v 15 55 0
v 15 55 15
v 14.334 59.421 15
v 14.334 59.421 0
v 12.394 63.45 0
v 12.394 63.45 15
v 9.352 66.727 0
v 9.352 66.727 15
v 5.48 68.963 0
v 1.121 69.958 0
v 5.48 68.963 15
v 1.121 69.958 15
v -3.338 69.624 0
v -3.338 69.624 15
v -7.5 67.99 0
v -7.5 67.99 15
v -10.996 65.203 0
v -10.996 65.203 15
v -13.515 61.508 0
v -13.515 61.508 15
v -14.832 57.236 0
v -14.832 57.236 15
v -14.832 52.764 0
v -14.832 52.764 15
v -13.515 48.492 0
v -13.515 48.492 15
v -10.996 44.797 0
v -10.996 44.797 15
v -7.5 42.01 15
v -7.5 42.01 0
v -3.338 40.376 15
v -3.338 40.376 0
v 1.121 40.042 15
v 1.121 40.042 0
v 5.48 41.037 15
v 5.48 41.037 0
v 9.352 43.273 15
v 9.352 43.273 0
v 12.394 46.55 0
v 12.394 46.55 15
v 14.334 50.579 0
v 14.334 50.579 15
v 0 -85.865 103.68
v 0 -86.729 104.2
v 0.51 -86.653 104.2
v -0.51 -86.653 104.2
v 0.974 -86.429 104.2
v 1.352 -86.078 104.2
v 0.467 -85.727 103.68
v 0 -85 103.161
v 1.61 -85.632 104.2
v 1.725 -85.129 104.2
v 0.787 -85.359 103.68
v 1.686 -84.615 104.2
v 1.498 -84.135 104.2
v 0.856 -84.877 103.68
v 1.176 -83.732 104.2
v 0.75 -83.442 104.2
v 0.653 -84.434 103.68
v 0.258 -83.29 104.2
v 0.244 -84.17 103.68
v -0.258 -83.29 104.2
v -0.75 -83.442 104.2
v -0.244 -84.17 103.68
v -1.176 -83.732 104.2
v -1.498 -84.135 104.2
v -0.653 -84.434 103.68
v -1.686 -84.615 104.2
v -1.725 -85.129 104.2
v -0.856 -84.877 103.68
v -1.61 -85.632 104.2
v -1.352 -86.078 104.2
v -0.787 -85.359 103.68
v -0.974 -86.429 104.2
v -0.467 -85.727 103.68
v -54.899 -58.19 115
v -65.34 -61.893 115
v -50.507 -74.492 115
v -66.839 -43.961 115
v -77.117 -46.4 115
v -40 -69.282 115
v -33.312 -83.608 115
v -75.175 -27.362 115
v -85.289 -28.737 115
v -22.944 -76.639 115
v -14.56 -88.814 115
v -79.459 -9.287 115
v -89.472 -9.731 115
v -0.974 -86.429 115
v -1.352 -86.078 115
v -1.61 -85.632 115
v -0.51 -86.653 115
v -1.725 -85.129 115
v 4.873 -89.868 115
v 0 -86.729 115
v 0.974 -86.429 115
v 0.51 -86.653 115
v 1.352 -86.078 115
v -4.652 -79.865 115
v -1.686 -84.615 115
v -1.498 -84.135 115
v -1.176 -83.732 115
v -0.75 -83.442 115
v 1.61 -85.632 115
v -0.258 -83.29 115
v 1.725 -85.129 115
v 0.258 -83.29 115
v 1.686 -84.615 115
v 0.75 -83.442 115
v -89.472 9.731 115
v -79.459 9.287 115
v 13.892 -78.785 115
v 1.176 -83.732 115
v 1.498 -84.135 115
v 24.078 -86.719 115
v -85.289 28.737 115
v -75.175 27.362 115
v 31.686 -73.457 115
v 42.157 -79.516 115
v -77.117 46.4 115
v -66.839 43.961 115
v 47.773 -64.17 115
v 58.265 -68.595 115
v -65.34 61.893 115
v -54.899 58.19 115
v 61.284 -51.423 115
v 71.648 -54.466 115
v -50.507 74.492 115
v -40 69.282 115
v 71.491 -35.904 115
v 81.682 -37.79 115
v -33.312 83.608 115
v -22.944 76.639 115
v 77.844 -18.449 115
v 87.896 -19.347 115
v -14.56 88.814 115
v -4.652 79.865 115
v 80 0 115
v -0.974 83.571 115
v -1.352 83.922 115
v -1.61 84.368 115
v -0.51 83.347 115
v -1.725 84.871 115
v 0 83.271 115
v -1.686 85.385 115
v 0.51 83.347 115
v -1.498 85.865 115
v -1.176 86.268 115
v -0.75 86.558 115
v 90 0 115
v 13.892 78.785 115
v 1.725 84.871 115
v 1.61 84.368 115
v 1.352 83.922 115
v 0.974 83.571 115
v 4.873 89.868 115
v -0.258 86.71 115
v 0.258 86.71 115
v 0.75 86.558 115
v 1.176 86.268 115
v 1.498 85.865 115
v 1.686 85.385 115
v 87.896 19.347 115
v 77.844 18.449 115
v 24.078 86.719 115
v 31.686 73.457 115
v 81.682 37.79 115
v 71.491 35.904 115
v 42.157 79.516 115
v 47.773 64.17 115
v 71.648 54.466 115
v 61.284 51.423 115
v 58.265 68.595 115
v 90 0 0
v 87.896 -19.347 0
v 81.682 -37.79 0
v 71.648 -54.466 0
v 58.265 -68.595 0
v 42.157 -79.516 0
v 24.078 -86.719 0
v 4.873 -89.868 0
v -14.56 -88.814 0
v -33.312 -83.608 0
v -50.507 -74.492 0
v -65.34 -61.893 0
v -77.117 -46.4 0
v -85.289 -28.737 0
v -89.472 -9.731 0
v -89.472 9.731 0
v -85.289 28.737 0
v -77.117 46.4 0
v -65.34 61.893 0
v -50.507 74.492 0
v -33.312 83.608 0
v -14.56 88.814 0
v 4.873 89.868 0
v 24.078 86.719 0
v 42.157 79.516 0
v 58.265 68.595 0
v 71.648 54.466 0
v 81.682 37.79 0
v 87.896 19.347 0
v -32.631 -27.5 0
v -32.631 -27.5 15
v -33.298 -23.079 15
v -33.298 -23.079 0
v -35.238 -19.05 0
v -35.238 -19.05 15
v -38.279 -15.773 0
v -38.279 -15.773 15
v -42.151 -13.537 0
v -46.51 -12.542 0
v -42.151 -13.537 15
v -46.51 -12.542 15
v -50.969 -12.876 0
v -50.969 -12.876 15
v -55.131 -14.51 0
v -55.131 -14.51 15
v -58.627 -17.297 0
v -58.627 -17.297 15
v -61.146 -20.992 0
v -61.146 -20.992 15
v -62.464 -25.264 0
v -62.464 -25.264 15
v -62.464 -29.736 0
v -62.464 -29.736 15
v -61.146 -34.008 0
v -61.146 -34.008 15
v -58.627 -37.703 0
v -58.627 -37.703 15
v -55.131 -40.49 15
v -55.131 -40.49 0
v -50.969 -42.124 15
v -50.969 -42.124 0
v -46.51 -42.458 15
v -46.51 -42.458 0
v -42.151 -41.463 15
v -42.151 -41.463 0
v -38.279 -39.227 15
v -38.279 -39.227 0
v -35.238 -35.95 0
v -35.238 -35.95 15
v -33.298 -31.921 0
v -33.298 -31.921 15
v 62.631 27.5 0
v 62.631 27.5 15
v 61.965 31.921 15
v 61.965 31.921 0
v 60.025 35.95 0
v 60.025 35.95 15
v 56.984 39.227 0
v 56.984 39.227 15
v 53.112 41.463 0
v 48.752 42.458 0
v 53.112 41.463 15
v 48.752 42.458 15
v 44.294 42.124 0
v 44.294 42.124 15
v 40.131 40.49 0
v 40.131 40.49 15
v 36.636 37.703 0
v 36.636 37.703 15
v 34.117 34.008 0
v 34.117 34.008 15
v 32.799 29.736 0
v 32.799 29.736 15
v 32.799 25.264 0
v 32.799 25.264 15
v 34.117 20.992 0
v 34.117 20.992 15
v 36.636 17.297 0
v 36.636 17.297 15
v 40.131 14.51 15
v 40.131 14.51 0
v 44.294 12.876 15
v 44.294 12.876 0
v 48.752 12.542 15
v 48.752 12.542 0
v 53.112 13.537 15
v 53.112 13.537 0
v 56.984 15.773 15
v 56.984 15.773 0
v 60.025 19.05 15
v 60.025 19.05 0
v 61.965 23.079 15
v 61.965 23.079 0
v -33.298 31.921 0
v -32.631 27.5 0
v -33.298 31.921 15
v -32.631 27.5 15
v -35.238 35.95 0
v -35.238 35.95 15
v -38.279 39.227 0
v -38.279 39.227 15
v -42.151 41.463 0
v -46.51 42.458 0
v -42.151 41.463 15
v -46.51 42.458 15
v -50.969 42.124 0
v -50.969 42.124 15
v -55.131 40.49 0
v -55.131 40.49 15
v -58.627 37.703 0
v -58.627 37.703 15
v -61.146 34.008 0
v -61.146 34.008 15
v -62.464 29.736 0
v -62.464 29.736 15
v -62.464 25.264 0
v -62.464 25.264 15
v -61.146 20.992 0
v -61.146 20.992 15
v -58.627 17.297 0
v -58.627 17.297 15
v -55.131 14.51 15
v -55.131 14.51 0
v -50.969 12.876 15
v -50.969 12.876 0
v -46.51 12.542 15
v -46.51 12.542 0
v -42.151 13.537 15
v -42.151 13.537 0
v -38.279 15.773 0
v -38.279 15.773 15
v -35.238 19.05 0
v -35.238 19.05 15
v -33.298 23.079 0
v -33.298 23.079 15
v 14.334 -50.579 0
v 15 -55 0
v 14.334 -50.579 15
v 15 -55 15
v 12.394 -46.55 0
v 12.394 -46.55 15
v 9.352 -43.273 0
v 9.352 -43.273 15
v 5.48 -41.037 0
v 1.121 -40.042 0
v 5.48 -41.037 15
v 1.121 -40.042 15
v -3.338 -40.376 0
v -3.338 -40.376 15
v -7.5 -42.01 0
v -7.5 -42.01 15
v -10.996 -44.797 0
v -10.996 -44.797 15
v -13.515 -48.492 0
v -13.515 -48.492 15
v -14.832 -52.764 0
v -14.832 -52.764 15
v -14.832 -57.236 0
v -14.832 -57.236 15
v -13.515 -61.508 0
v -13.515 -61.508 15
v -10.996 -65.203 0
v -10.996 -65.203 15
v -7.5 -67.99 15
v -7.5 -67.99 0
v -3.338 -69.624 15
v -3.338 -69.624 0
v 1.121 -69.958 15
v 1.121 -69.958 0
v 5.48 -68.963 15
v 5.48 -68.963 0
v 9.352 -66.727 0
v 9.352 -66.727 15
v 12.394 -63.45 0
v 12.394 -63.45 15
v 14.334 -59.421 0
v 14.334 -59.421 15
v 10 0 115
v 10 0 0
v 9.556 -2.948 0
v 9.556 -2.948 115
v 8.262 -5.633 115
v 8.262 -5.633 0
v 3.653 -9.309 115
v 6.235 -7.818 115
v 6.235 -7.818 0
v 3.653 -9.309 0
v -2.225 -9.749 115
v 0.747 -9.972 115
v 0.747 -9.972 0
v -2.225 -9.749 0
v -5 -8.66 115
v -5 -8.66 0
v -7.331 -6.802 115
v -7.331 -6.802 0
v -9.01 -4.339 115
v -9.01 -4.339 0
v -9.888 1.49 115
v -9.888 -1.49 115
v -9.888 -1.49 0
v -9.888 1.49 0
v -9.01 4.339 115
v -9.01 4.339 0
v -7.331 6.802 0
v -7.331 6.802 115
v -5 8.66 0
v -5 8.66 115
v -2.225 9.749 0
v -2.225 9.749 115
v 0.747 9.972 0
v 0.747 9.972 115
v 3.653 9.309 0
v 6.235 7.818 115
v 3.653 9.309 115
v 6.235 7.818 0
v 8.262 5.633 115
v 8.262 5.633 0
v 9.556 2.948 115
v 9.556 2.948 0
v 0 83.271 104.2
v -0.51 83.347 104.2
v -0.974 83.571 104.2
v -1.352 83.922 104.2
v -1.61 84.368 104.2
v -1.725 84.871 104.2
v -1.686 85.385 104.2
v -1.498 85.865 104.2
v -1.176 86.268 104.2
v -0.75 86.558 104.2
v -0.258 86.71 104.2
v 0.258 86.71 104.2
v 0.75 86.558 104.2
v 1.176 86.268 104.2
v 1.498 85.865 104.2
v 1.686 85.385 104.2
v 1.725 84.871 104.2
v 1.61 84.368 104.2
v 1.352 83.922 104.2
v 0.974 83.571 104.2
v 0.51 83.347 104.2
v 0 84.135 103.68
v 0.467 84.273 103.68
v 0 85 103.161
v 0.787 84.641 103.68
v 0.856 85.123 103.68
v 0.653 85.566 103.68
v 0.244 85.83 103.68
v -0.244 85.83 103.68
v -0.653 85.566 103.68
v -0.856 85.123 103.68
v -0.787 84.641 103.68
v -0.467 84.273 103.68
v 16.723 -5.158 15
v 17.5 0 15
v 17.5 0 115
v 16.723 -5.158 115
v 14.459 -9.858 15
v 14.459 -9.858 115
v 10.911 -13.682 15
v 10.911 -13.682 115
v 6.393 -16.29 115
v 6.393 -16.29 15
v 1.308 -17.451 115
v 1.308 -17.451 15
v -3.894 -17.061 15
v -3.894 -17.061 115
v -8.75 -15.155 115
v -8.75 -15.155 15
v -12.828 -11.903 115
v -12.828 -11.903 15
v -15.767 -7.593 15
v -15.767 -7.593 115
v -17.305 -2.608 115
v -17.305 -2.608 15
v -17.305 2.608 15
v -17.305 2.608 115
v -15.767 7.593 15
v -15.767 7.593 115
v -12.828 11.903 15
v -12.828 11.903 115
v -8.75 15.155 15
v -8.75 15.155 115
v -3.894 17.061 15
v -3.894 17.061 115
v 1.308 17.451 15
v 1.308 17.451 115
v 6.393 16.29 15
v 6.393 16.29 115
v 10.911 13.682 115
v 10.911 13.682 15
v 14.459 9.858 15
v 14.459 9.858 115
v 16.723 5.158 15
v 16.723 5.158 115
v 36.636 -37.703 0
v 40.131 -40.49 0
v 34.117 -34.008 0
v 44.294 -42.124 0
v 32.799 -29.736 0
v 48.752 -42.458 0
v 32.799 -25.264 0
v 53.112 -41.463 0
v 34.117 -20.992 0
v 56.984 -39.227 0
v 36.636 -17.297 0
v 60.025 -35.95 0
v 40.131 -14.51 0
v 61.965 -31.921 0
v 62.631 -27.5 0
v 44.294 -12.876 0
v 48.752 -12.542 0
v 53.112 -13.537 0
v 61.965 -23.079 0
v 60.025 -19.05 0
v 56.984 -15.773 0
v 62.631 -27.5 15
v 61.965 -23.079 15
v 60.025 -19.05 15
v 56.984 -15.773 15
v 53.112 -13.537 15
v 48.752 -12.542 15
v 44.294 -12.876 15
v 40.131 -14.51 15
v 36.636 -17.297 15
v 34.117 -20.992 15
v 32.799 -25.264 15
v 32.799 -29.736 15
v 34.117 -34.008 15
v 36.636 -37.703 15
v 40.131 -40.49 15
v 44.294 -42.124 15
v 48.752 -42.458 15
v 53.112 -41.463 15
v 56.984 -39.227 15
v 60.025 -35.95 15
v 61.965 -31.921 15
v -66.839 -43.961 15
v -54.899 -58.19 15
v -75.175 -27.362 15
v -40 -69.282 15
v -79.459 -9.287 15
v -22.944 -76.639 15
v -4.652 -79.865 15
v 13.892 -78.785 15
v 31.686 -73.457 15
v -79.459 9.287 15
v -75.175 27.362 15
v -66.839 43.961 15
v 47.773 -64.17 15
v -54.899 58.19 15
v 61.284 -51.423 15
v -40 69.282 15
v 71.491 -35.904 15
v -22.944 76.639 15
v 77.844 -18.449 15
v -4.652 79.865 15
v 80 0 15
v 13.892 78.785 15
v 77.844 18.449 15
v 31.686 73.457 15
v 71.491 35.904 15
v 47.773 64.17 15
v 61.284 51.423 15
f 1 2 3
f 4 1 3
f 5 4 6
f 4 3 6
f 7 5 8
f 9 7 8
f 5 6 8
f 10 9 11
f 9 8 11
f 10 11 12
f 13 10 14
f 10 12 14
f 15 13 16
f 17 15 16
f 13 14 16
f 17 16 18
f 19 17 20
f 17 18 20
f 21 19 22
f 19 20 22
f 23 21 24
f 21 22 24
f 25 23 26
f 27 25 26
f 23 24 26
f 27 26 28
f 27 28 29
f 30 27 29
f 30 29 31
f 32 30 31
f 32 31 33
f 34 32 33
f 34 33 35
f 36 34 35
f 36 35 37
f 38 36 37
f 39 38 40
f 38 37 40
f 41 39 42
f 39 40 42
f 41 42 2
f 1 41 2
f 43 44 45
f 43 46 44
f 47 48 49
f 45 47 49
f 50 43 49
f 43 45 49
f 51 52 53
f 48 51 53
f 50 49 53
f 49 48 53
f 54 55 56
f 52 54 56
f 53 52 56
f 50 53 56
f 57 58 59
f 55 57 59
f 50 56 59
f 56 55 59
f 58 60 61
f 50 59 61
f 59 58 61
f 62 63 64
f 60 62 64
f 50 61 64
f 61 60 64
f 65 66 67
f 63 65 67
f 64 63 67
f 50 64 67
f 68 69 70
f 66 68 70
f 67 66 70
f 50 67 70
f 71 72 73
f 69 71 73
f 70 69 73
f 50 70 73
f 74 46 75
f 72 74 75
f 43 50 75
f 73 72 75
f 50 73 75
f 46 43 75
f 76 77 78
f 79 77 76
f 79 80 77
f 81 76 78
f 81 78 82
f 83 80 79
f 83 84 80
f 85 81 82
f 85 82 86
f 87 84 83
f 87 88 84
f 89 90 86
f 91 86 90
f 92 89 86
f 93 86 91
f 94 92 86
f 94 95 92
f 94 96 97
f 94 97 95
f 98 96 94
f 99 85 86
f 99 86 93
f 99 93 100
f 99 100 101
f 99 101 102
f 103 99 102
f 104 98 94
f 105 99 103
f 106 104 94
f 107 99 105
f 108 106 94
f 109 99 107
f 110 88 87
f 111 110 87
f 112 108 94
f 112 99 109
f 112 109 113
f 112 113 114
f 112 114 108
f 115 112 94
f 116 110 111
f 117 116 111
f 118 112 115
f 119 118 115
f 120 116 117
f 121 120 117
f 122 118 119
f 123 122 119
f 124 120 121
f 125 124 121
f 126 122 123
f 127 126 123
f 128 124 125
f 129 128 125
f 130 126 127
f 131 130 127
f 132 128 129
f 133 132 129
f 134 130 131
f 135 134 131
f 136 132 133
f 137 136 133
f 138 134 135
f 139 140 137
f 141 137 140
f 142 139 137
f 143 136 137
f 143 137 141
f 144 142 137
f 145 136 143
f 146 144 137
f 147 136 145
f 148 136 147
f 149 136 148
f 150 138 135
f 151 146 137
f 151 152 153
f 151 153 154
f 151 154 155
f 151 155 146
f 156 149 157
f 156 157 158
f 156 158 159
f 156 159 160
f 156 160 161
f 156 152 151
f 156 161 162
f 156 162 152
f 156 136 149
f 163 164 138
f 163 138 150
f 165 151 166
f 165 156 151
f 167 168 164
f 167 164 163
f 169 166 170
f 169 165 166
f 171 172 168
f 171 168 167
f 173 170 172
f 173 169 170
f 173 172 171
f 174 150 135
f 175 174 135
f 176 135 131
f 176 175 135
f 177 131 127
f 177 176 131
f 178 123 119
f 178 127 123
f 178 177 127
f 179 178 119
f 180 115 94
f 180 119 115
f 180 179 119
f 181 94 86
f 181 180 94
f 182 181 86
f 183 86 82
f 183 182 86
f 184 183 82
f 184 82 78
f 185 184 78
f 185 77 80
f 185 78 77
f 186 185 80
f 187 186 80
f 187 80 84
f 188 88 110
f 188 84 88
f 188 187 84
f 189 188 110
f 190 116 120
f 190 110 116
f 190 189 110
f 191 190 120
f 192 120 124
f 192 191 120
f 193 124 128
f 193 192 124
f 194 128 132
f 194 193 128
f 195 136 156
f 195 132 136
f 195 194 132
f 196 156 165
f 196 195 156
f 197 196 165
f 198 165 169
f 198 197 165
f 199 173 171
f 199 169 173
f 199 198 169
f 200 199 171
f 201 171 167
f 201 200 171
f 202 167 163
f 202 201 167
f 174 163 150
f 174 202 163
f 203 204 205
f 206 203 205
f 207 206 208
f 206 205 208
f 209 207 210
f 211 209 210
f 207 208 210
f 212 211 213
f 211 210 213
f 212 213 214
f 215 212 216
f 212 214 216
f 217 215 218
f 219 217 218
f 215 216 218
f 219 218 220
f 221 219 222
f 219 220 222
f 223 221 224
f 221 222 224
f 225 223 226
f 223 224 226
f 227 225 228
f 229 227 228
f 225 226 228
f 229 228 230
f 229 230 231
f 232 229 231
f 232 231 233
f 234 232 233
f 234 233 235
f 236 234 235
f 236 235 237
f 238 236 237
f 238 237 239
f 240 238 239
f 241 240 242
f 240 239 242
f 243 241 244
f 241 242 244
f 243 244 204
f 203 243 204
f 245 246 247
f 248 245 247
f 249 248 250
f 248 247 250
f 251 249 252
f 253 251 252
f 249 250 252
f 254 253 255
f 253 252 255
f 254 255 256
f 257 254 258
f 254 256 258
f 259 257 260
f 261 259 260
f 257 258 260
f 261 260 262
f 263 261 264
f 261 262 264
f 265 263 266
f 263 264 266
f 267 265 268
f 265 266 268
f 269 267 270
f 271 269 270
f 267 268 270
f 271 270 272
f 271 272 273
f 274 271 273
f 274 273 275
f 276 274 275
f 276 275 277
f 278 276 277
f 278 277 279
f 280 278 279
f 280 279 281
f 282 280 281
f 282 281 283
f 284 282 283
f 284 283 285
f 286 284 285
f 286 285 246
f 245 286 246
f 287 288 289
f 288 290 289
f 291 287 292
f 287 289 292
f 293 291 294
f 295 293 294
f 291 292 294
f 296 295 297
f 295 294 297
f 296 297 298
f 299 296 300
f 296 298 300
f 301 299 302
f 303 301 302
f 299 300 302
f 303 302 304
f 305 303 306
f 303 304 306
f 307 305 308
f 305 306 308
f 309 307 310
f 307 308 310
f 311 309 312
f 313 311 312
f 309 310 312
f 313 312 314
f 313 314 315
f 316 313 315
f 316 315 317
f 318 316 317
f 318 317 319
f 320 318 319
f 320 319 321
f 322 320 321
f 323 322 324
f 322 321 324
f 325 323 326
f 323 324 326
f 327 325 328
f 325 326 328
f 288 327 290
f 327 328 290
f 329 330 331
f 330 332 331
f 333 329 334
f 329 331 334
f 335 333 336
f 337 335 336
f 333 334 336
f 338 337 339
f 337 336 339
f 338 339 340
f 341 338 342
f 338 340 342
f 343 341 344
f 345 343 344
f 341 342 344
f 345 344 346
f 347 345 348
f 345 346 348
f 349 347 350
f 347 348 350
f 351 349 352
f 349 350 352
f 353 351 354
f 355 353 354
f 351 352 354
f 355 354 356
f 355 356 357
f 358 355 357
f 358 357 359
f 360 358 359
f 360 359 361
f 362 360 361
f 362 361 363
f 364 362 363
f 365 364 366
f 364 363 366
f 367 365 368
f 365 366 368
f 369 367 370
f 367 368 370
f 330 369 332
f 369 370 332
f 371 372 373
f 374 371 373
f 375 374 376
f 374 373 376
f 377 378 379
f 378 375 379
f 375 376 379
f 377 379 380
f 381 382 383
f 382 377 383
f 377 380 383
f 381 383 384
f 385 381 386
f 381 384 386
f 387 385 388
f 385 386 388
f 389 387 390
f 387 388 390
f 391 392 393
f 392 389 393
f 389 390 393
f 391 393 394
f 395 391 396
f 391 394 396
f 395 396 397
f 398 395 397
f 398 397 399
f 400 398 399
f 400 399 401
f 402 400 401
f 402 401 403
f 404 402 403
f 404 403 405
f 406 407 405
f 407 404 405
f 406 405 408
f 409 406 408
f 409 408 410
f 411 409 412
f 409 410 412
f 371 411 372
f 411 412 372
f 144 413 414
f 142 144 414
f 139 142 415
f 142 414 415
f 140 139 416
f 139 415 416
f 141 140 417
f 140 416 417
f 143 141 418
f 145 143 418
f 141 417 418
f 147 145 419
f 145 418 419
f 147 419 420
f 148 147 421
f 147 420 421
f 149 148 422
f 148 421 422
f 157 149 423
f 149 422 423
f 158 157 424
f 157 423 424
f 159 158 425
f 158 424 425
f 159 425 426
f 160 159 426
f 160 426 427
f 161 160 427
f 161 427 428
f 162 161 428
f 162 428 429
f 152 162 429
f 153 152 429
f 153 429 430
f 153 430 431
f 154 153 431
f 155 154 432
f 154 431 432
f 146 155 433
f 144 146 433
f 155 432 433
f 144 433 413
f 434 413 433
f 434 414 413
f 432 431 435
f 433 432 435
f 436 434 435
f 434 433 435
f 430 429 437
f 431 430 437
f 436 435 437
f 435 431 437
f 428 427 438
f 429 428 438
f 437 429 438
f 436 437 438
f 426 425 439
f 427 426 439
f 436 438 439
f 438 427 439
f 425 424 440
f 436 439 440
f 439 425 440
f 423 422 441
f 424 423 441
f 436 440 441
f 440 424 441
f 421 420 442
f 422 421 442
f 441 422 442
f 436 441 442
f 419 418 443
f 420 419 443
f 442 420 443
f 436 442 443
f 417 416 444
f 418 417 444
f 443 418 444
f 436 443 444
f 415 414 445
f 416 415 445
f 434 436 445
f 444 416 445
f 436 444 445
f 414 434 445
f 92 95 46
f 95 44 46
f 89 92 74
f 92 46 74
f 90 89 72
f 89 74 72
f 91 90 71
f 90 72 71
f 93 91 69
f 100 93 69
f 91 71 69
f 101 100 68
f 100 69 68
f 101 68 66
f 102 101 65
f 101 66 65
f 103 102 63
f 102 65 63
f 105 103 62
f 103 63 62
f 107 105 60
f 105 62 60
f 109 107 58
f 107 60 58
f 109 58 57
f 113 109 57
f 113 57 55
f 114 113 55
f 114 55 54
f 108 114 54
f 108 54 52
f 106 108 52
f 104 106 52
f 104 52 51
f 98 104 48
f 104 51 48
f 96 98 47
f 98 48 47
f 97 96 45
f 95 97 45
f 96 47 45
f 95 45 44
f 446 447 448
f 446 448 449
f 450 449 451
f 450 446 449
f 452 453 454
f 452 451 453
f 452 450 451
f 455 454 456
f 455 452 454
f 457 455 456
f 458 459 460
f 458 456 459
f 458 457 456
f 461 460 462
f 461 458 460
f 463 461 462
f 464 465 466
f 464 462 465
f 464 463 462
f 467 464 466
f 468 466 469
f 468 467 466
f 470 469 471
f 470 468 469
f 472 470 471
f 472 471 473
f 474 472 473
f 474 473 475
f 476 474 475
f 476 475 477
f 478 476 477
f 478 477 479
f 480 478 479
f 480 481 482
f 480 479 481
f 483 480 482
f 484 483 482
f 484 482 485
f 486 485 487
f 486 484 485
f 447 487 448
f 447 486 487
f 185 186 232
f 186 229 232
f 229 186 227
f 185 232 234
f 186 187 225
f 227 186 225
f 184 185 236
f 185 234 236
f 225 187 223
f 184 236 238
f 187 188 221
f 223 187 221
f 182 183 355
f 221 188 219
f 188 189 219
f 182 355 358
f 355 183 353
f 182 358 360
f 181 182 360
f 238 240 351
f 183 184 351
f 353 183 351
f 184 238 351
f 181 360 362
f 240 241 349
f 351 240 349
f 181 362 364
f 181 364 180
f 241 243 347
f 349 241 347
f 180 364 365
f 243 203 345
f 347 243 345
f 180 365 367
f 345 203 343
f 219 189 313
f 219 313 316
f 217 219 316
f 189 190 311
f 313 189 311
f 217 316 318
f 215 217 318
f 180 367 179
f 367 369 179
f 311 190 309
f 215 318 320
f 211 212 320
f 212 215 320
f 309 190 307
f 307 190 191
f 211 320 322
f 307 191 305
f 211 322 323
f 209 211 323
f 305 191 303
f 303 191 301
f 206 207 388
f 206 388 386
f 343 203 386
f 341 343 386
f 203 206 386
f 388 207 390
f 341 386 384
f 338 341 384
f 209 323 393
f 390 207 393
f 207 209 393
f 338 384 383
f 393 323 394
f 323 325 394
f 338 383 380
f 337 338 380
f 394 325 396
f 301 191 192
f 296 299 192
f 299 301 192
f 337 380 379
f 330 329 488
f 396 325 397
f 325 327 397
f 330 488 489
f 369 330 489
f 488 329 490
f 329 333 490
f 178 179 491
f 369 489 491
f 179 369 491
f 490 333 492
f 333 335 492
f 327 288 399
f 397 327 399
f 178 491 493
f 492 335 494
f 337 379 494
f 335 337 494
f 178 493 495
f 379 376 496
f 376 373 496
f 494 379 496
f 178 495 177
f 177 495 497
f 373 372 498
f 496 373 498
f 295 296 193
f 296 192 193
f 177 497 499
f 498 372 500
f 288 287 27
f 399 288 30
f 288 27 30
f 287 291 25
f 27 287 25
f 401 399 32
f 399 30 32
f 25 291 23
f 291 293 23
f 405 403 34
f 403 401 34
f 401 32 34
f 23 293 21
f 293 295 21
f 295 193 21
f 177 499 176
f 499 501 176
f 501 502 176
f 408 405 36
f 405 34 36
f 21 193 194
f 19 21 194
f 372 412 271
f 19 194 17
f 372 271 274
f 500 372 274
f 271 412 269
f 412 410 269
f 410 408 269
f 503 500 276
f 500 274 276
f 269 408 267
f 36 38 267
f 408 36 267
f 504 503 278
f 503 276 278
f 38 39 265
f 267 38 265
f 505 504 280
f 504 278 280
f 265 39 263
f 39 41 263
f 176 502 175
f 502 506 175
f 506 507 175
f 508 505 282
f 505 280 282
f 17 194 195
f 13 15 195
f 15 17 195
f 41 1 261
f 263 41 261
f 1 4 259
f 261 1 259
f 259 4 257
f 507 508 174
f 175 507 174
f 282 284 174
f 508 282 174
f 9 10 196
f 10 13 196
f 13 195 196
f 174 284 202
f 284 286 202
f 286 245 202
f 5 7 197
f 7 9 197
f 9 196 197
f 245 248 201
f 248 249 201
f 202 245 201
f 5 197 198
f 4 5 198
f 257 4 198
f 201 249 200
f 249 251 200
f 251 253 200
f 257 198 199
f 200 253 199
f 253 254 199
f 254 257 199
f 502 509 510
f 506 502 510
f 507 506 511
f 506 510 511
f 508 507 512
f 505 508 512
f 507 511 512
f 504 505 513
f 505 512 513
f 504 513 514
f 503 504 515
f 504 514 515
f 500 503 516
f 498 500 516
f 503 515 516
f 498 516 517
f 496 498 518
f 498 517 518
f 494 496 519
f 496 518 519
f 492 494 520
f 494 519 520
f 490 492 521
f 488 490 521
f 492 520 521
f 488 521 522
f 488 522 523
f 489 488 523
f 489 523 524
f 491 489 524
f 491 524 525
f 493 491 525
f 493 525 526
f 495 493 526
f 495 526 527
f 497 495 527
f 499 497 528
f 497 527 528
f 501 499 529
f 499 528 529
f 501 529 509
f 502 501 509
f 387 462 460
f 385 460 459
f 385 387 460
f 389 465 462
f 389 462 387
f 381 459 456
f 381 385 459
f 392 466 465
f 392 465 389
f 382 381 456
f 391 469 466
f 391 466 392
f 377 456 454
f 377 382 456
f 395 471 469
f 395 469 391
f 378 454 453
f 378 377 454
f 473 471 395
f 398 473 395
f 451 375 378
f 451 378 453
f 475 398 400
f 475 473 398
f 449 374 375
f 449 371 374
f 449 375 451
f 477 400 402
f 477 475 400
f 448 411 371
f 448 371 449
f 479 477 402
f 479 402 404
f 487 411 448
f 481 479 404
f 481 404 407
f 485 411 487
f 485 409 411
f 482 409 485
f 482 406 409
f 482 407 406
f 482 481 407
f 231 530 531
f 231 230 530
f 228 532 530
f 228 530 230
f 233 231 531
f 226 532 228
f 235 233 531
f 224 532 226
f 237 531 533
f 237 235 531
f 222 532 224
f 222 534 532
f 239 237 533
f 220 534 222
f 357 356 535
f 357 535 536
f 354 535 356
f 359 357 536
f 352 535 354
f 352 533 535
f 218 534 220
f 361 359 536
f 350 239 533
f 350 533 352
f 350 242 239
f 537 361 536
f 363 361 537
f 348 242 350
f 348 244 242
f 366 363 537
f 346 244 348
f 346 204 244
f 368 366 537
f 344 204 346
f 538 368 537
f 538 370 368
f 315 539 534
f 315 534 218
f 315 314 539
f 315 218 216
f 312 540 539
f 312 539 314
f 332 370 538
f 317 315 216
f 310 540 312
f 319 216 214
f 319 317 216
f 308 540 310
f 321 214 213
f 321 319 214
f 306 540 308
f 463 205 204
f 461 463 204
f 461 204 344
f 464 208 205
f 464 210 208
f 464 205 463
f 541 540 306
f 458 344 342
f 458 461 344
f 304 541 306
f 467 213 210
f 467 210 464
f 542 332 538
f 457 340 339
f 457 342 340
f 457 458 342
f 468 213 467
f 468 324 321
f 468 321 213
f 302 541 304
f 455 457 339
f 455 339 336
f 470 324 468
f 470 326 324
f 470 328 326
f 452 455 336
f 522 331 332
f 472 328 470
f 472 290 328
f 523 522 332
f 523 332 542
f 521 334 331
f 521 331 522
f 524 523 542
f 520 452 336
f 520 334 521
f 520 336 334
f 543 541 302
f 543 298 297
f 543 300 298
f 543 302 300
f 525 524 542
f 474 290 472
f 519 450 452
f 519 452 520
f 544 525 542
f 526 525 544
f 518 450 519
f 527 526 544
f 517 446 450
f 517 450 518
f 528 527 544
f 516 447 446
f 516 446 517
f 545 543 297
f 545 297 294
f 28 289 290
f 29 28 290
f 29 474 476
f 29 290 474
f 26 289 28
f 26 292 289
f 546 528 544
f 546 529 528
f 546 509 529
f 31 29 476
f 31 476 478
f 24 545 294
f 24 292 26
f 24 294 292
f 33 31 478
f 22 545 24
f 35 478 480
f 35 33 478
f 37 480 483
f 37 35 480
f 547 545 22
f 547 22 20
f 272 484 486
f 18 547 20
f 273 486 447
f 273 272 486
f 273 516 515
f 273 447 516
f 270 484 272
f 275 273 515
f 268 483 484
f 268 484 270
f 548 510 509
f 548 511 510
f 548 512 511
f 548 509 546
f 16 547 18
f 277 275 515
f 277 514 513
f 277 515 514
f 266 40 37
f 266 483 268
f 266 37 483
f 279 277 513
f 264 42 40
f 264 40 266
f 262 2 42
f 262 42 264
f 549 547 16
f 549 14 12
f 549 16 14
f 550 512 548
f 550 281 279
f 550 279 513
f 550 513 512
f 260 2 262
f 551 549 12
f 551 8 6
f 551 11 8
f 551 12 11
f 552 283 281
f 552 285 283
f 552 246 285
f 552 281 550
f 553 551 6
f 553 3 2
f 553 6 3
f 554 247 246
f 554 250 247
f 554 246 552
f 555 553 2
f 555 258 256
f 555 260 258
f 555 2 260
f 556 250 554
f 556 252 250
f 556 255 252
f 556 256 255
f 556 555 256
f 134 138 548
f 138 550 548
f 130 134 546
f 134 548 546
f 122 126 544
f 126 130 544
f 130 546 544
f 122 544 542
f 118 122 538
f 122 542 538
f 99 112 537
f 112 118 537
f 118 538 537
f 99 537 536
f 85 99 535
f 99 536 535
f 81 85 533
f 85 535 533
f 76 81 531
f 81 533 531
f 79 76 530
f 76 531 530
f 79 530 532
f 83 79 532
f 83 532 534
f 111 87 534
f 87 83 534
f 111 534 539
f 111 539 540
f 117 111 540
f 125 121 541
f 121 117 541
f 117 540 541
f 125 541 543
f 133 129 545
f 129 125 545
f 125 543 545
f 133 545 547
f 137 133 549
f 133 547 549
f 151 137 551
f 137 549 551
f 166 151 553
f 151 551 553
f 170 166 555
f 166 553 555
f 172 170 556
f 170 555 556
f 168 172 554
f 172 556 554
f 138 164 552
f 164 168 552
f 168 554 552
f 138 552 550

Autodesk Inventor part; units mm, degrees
ref_plane "YZ Plane" through (0, 0, 0) normal (1, 0, 0) x (0, 1, 0)
ref_plane "XZ Plane" through (0, 0, 0) normal (0, 1, 0) x (-1, 0, 0)
ref_plane "XY Plane" through (0, 0, 0) normal (0, 0, 1) x (1, 0, 0)
sketch "Sketch1" plane through (0, 0, 0) normal (0, 0, 1) x (1, 0, 0)
  circle A0 centre (0, 0) radius 90
  circle A1 centre (0, 0) radius 10
  dimension "d1" = 20
  dimension "d2" = 180
extrude "Extrusion1" add sketch "Sketch1" along normal blind 15
sketch "Sketch2" plane through (0, 0, 15) normal (0, 0, 1) x (1, 0, 0)
  circle A0 centre (0, 55) radius 25
  circle A1 centre (-47.6314, 27.5) radius 25
  circle A2 centre (-47.6314, -27.5) radius 25
  circle A3 centre (0, -55) radius 25
  circle A4 centre (47.6314, -27.5) radius 25
  circle A5 centre (47.6314, 27.5) radius 25
  circle A6 centre (0, 55) radius 15
  circle A7 centre (-47.6314, 27.5) radius 15
  circle A8 centre (-47.6314, -27.5) radius 15
  circle A9 centre (0, -55) radius 15
  circle A10 centre (47.6314, -27.5) radius 15
  circle A11 centre (47.6314, 27.5) radius 15
  point P0 (0, 0)
  point P1 (0, 0)
  point P2 (0, 0)
  point P3 (0, 0)
  point P4 (0, 0)
  point P5 (0, 0)
  dimension "d5" = 50
  dimension "d6" = 55
  dimension "d9" = 360
  dimension "d11" = 30
  dimension "d14" = 360
extrude "Extrusion2" cut sketch "Sketch2" against normal blind 15 contours A6 | A7 | A8 | A9 | A10 | A11
sketch "Sketch3" plane through (0, 0, 15) normal (0, 0, 1) x (1, 0, 0)
  circle A0 centre (0, 0) radius 90
  circle A1 centre (0, 0) radius 80
  dimension "d18" = 160
  dimension "d19" = 180
extrude "Extrusion3" add sketch "Sketch3" along normal blind 100
sketch "Sketch4" plane through (0, 0, 15) normal (0, 0, 1) x (1, 0, 0)
  circle A0 centre (0, -54.6919) radius 25
  circle A1 centre (47.3646, -27.3459) radius 25
  circle A2 centre (47.3646, 27.3459) radius 25
  circle A3 centre (0, 54.6919) radius 25
  circle A4 centre (-47.3646, 27.3459) radius 25
  circle A5 centre (-47.3646, -27.3459) radius 25
  circle A6 centre (0, 0) radius 17.5
  circle A7 centre (0, 0) radius 10
  dimension "d22" = 50
  dimension "d25" = 360
  dimension "d27" = 35
extrude "Extrusion4" add sketch "Sketch4" along normal blind 100 contours A6 | A7
sketch "Sketch5" plane through (0, 0, 115) normal (0, 0, 1) x (1, 0, 0)
  circle A0 centre (0, 0) radius 10
  dimension "d30" = 20
extrude "Extrusion5" cut sketch "Sketch5" against normal through all
sketch "Sketch8" plane through (0, 0, 115) normal (0, 0, 1) x (1, 0, 0)
  point P0 (0, 0)
  point P1 (0, 85)
  point P2 (0, -85)
  dimension "d37" = 85
  dimension "d38" = 85
hole "Hole1" at (0, 85, 115) at (0, -85, 115) direction (0, 0, -1) diameter 3.4587 depth 10.8 tip angle 118 thread size "M4x0.5" class "6H" standard "ISO Metric profile"
equation "\"BendRadius\" = Thickness"
equation "\"BendReliefWidth\" = Thickness"
equation "\"BendReliefDepth\" = 0.5 * Thickness"
equation "\"CornerReliefSize\" = 4 * Thickness"
equation "\"MinimumRemnant\" = 2 * Thickness"
equation "\"TransitionRadius\" = BendRadius"
equation "\"JacobiRadiusSize\" = BendRadius"
equation "\"GapSize\" = Thickness"
equation "\"Thickness\" = 0.5"
properties part number "Electromagnet cover"
